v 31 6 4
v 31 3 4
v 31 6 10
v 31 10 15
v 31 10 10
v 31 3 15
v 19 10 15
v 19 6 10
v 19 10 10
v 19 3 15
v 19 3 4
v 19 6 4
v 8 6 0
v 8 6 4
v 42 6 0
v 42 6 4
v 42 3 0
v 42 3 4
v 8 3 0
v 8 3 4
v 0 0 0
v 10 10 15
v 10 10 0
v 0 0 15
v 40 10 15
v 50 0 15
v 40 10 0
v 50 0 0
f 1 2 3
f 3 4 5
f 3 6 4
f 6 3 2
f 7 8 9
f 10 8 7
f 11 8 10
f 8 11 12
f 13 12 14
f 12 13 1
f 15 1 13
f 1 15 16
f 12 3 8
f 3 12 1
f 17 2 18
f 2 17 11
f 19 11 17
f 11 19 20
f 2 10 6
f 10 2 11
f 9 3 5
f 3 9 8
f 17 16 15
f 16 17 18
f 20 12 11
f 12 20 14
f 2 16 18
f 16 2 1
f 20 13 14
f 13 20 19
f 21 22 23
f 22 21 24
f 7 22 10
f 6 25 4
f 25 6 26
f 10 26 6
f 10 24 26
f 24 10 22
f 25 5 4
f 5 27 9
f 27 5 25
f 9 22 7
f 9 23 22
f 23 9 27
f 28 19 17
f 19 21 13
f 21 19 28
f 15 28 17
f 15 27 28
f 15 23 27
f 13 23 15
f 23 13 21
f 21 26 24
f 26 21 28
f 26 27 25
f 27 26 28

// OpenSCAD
/* This is meant to be attached to the edge of a dashboard to allow
a "vent" cell phone holder to be attached there instead of to an air
conditioning vent (useful for cars such as mine with inconveniently
placed vents. */

difference(){
    linear_extrude(15)polygon([[0,0],[50,0],[40,10],[10,10]]);
    union(){
        translate([19,3,-1])cube([12,3,20]);
        translate([19,3,10])cube([12,10,9]);
        translate([8,3,-1])cube([34,3,5]);
        translate([19,4,-1])cube([12,2,3]);
    }
}
